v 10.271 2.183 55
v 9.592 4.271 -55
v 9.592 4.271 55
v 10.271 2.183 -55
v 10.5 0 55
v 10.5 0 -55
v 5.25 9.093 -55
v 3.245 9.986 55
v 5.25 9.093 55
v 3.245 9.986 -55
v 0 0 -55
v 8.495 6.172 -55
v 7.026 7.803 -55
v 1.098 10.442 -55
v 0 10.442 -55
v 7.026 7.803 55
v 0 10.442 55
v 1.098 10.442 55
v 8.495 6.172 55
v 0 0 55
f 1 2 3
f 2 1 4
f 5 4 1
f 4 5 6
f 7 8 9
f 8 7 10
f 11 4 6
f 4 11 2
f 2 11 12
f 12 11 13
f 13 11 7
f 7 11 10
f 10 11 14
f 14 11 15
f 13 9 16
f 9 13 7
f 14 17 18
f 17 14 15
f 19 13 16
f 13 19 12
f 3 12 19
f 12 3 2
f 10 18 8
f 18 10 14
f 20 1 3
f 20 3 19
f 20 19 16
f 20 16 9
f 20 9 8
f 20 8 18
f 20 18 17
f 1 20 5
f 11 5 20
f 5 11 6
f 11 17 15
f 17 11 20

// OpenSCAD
// Library: cutting_wedge.scad
// Version: 1.0.0
// Author: David Bowers
// Copyright: 2022
// License: 2-clause BSD License (http://opensource.org/licenses/BSD-2-Clause)

// Will produce a wedge to be used with difference();
// cutting_wedge(angle:int, outside:int, height:int); 


module cutting_wedge(angle=90, outside=21, height=110){
    cutters = [outside*2,outside,height+0.5];
    echo (angle);
    difference(){
        cylinder(h=height,d=outside,center=true);
        rotate([0,0,angle])
        translate([outside,outside/2,-0.1])
        cube(cutters,center=true);
        translate([0,-outside/2,-0.1])
        cube(cutters,center=true);
    }
}

cutting_wedge();
